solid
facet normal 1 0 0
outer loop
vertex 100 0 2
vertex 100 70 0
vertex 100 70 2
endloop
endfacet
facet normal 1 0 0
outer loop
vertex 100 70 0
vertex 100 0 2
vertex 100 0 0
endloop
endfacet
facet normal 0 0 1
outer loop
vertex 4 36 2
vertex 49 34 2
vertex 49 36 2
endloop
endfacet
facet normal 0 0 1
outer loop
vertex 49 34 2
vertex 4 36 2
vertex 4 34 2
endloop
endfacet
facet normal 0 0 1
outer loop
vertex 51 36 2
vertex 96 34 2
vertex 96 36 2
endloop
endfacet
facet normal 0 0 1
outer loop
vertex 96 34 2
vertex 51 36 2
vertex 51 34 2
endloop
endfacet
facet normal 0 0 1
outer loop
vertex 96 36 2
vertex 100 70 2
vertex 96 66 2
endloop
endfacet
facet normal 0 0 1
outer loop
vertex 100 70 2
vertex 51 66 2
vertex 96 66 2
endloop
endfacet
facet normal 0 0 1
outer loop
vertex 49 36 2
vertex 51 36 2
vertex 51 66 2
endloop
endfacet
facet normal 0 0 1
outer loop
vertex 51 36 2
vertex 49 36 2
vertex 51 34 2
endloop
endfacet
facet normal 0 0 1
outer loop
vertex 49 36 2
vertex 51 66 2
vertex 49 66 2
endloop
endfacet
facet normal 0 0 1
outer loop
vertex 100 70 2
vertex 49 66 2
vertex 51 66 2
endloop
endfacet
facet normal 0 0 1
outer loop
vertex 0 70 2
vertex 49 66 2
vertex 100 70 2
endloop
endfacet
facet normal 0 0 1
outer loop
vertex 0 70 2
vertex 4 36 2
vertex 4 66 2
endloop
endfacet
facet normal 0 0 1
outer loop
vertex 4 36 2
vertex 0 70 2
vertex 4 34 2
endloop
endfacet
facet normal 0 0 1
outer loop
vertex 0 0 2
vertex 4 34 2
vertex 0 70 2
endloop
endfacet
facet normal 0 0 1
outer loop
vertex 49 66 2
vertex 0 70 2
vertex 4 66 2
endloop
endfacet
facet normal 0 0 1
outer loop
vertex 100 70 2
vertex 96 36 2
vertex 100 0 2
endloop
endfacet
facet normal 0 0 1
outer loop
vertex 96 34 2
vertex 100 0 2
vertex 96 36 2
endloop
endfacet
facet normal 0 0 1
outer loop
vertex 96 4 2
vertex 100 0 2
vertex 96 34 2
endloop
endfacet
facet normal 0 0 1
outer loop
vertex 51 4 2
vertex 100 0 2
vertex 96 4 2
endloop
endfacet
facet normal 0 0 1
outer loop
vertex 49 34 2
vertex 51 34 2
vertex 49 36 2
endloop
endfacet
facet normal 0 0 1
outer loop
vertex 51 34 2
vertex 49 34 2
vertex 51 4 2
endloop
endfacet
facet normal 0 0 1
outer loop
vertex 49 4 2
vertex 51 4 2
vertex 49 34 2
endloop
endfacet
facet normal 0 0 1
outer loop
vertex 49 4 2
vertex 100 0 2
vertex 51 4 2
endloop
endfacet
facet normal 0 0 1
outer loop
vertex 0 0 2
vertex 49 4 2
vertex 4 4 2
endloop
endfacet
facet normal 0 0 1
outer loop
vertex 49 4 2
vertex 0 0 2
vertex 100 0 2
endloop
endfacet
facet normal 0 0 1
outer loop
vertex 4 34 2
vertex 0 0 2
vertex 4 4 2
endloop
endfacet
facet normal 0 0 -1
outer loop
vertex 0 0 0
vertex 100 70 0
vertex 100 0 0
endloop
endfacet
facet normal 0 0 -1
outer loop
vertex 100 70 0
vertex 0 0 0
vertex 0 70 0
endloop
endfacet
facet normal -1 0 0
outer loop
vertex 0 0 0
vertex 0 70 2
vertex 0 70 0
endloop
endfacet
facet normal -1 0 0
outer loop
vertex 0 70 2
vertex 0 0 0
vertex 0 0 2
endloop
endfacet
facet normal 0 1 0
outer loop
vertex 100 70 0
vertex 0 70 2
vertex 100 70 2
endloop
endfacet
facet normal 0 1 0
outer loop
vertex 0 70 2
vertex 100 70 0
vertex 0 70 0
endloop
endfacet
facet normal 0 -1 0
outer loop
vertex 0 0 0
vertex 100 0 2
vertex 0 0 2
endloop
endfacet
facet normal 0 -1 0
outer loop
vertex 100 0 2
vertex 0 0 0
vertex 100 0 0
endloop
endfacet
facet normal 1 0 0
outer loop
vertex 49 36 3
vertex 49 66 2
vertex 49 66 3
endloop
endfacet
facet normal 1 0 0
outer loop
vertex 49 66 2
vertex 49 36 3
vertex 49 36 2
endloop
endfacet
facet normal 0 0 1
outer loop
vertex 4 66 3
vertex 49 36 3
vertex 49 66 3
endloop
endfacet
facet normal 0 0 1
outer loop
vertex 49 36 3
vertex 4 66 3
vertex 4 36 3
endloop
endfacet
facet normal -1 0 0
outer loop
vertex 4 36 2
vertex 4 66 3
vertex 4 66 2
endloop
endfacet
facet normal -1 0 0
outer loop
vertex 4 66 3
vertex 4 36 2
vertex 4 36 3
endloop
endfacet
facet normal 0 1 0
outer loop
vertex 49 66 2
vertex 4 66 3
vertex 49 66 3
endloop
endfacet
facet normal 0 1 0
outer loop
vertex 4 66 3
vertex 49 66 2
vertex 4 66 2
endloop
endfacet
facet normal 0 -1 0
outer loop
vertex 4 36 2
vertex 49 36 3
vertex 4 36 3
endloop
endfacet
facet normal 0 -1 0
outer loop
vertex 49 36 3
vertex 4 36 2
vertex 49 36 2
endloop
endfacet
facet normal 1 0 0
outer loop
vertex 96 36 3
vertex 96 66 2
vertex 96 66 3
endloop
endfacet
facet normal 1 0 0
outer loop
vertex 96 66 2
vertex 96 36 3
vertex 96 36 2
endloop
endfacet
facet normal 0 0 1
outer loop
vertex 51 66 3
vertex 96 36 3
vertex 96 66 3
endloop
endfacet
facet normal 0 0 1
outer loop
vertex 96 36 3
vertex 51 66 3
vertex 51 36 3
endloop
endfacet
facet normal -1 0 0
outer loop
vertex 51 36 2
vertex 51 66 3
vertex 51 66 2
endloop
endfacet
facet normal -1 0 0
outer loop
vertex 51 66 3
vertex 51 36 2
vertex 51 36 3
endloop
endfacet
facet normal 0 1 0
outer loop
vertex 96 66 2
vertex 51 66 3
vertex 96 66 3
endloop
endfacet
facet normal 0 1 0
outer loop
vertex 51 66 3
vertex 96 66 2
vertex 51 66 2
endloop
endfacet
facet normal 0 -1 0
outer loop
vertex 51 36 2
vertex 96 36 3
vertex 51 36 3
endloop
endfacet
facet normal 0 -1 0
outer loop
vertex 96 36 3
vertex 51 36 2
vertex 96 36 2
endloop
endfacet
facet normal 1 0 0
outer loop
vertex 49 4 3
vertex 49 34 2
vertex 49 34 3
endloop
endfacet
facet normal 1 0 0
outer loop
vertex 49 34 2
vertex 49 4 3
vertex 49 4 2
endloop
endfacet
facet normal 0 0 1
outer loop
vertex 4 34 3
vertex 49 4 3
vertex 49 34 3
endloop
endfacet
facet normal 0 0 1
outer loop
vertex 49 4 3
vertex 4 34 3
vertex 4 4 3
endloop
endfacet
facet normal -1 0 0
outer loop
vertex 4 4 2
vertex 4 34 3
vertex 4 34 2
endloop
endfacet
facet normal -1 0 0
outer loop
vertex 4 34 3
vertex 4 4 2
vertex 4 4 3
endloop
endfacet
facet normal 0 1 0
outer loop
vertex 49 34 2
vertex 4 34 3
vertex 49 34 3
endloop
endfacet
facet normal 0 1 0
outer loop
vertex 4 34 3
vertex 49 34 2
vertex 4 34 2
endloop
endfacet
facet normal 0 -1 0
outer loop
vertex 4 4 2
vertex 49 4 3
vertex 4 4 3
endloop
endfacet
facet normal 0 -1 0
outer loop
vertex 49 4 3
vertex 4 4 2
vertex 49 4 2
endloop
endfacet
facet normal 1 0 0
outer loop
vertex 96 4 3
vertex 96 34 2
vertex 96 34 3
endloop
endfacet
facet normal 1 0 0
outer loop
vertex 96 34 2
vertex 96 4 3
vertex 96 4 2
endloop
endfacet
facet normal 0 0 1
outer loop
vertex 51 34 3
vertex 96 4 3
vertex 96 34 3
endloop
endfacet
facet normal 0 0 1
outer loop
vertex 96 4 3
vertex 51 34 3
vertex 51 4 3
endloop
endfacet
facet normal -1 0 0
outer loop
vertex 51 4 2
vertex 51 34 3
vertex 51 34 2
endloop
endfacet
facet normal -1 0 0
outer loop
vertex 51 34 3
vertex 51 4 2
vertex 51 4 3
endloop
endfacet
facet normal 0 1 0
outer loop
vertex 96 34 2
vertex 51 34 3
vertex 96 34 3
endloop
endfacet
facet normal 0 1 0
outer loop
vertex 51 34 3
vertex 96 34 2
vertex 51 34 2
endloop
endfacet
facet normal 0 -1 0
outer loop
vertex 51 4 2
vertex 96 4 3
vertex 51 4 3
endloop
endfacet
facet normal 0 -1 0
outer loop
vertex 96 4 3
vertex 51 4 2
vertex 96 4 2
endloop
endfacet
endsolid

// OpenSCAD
// Units: mm. Default total bounds: [0,0,0] .. [100,70,3].
width = 100;
height = 70;
base_thickness = 2;
decor_height = 1;
margin = 4;
gap = 2;
part = "assembly"; // assembly, base, red, yellow, green, blue
part_width = (width - 2*margin - gap)/2;
part_height = (height - 2*margin - gap)/2;
assert(width > 2*margin+gap && height > 2*margin+gap);
assert(base_thickness > 0 && decor_height > 0 && margin > 0 && gap > 0);
assert(part == "assembly" || part == "base" || part == "red" ||
       part == "yellow" || part == "green" || part == "blue");
module base() { color("royalblue") cube([width,height,base_thickness]); }
module tile(col, ix, iy) {
    color(col) translate([margin+ix*(part_width+gap),
                         margin+iy*(part_height+gap),base_thickness])
        cube([part_width,part_height,decor_height]);
}
module selected() {
    if (part == "assembly" || part == "base") base();
    if (part == "assembly" || part == "red") tile("red",0,1);
    if (part == "assembly" || part == "yellow") tile("gold",1,1);
    if (part == "assembly" || part == "green") tile("limegreen",0,0);
    if (part == "assembly" || part == "blue") tile("royalblue",1,0);
}
// A real CSG union removes internal contact faces in the overall printable STL.
union() { selected(); }
